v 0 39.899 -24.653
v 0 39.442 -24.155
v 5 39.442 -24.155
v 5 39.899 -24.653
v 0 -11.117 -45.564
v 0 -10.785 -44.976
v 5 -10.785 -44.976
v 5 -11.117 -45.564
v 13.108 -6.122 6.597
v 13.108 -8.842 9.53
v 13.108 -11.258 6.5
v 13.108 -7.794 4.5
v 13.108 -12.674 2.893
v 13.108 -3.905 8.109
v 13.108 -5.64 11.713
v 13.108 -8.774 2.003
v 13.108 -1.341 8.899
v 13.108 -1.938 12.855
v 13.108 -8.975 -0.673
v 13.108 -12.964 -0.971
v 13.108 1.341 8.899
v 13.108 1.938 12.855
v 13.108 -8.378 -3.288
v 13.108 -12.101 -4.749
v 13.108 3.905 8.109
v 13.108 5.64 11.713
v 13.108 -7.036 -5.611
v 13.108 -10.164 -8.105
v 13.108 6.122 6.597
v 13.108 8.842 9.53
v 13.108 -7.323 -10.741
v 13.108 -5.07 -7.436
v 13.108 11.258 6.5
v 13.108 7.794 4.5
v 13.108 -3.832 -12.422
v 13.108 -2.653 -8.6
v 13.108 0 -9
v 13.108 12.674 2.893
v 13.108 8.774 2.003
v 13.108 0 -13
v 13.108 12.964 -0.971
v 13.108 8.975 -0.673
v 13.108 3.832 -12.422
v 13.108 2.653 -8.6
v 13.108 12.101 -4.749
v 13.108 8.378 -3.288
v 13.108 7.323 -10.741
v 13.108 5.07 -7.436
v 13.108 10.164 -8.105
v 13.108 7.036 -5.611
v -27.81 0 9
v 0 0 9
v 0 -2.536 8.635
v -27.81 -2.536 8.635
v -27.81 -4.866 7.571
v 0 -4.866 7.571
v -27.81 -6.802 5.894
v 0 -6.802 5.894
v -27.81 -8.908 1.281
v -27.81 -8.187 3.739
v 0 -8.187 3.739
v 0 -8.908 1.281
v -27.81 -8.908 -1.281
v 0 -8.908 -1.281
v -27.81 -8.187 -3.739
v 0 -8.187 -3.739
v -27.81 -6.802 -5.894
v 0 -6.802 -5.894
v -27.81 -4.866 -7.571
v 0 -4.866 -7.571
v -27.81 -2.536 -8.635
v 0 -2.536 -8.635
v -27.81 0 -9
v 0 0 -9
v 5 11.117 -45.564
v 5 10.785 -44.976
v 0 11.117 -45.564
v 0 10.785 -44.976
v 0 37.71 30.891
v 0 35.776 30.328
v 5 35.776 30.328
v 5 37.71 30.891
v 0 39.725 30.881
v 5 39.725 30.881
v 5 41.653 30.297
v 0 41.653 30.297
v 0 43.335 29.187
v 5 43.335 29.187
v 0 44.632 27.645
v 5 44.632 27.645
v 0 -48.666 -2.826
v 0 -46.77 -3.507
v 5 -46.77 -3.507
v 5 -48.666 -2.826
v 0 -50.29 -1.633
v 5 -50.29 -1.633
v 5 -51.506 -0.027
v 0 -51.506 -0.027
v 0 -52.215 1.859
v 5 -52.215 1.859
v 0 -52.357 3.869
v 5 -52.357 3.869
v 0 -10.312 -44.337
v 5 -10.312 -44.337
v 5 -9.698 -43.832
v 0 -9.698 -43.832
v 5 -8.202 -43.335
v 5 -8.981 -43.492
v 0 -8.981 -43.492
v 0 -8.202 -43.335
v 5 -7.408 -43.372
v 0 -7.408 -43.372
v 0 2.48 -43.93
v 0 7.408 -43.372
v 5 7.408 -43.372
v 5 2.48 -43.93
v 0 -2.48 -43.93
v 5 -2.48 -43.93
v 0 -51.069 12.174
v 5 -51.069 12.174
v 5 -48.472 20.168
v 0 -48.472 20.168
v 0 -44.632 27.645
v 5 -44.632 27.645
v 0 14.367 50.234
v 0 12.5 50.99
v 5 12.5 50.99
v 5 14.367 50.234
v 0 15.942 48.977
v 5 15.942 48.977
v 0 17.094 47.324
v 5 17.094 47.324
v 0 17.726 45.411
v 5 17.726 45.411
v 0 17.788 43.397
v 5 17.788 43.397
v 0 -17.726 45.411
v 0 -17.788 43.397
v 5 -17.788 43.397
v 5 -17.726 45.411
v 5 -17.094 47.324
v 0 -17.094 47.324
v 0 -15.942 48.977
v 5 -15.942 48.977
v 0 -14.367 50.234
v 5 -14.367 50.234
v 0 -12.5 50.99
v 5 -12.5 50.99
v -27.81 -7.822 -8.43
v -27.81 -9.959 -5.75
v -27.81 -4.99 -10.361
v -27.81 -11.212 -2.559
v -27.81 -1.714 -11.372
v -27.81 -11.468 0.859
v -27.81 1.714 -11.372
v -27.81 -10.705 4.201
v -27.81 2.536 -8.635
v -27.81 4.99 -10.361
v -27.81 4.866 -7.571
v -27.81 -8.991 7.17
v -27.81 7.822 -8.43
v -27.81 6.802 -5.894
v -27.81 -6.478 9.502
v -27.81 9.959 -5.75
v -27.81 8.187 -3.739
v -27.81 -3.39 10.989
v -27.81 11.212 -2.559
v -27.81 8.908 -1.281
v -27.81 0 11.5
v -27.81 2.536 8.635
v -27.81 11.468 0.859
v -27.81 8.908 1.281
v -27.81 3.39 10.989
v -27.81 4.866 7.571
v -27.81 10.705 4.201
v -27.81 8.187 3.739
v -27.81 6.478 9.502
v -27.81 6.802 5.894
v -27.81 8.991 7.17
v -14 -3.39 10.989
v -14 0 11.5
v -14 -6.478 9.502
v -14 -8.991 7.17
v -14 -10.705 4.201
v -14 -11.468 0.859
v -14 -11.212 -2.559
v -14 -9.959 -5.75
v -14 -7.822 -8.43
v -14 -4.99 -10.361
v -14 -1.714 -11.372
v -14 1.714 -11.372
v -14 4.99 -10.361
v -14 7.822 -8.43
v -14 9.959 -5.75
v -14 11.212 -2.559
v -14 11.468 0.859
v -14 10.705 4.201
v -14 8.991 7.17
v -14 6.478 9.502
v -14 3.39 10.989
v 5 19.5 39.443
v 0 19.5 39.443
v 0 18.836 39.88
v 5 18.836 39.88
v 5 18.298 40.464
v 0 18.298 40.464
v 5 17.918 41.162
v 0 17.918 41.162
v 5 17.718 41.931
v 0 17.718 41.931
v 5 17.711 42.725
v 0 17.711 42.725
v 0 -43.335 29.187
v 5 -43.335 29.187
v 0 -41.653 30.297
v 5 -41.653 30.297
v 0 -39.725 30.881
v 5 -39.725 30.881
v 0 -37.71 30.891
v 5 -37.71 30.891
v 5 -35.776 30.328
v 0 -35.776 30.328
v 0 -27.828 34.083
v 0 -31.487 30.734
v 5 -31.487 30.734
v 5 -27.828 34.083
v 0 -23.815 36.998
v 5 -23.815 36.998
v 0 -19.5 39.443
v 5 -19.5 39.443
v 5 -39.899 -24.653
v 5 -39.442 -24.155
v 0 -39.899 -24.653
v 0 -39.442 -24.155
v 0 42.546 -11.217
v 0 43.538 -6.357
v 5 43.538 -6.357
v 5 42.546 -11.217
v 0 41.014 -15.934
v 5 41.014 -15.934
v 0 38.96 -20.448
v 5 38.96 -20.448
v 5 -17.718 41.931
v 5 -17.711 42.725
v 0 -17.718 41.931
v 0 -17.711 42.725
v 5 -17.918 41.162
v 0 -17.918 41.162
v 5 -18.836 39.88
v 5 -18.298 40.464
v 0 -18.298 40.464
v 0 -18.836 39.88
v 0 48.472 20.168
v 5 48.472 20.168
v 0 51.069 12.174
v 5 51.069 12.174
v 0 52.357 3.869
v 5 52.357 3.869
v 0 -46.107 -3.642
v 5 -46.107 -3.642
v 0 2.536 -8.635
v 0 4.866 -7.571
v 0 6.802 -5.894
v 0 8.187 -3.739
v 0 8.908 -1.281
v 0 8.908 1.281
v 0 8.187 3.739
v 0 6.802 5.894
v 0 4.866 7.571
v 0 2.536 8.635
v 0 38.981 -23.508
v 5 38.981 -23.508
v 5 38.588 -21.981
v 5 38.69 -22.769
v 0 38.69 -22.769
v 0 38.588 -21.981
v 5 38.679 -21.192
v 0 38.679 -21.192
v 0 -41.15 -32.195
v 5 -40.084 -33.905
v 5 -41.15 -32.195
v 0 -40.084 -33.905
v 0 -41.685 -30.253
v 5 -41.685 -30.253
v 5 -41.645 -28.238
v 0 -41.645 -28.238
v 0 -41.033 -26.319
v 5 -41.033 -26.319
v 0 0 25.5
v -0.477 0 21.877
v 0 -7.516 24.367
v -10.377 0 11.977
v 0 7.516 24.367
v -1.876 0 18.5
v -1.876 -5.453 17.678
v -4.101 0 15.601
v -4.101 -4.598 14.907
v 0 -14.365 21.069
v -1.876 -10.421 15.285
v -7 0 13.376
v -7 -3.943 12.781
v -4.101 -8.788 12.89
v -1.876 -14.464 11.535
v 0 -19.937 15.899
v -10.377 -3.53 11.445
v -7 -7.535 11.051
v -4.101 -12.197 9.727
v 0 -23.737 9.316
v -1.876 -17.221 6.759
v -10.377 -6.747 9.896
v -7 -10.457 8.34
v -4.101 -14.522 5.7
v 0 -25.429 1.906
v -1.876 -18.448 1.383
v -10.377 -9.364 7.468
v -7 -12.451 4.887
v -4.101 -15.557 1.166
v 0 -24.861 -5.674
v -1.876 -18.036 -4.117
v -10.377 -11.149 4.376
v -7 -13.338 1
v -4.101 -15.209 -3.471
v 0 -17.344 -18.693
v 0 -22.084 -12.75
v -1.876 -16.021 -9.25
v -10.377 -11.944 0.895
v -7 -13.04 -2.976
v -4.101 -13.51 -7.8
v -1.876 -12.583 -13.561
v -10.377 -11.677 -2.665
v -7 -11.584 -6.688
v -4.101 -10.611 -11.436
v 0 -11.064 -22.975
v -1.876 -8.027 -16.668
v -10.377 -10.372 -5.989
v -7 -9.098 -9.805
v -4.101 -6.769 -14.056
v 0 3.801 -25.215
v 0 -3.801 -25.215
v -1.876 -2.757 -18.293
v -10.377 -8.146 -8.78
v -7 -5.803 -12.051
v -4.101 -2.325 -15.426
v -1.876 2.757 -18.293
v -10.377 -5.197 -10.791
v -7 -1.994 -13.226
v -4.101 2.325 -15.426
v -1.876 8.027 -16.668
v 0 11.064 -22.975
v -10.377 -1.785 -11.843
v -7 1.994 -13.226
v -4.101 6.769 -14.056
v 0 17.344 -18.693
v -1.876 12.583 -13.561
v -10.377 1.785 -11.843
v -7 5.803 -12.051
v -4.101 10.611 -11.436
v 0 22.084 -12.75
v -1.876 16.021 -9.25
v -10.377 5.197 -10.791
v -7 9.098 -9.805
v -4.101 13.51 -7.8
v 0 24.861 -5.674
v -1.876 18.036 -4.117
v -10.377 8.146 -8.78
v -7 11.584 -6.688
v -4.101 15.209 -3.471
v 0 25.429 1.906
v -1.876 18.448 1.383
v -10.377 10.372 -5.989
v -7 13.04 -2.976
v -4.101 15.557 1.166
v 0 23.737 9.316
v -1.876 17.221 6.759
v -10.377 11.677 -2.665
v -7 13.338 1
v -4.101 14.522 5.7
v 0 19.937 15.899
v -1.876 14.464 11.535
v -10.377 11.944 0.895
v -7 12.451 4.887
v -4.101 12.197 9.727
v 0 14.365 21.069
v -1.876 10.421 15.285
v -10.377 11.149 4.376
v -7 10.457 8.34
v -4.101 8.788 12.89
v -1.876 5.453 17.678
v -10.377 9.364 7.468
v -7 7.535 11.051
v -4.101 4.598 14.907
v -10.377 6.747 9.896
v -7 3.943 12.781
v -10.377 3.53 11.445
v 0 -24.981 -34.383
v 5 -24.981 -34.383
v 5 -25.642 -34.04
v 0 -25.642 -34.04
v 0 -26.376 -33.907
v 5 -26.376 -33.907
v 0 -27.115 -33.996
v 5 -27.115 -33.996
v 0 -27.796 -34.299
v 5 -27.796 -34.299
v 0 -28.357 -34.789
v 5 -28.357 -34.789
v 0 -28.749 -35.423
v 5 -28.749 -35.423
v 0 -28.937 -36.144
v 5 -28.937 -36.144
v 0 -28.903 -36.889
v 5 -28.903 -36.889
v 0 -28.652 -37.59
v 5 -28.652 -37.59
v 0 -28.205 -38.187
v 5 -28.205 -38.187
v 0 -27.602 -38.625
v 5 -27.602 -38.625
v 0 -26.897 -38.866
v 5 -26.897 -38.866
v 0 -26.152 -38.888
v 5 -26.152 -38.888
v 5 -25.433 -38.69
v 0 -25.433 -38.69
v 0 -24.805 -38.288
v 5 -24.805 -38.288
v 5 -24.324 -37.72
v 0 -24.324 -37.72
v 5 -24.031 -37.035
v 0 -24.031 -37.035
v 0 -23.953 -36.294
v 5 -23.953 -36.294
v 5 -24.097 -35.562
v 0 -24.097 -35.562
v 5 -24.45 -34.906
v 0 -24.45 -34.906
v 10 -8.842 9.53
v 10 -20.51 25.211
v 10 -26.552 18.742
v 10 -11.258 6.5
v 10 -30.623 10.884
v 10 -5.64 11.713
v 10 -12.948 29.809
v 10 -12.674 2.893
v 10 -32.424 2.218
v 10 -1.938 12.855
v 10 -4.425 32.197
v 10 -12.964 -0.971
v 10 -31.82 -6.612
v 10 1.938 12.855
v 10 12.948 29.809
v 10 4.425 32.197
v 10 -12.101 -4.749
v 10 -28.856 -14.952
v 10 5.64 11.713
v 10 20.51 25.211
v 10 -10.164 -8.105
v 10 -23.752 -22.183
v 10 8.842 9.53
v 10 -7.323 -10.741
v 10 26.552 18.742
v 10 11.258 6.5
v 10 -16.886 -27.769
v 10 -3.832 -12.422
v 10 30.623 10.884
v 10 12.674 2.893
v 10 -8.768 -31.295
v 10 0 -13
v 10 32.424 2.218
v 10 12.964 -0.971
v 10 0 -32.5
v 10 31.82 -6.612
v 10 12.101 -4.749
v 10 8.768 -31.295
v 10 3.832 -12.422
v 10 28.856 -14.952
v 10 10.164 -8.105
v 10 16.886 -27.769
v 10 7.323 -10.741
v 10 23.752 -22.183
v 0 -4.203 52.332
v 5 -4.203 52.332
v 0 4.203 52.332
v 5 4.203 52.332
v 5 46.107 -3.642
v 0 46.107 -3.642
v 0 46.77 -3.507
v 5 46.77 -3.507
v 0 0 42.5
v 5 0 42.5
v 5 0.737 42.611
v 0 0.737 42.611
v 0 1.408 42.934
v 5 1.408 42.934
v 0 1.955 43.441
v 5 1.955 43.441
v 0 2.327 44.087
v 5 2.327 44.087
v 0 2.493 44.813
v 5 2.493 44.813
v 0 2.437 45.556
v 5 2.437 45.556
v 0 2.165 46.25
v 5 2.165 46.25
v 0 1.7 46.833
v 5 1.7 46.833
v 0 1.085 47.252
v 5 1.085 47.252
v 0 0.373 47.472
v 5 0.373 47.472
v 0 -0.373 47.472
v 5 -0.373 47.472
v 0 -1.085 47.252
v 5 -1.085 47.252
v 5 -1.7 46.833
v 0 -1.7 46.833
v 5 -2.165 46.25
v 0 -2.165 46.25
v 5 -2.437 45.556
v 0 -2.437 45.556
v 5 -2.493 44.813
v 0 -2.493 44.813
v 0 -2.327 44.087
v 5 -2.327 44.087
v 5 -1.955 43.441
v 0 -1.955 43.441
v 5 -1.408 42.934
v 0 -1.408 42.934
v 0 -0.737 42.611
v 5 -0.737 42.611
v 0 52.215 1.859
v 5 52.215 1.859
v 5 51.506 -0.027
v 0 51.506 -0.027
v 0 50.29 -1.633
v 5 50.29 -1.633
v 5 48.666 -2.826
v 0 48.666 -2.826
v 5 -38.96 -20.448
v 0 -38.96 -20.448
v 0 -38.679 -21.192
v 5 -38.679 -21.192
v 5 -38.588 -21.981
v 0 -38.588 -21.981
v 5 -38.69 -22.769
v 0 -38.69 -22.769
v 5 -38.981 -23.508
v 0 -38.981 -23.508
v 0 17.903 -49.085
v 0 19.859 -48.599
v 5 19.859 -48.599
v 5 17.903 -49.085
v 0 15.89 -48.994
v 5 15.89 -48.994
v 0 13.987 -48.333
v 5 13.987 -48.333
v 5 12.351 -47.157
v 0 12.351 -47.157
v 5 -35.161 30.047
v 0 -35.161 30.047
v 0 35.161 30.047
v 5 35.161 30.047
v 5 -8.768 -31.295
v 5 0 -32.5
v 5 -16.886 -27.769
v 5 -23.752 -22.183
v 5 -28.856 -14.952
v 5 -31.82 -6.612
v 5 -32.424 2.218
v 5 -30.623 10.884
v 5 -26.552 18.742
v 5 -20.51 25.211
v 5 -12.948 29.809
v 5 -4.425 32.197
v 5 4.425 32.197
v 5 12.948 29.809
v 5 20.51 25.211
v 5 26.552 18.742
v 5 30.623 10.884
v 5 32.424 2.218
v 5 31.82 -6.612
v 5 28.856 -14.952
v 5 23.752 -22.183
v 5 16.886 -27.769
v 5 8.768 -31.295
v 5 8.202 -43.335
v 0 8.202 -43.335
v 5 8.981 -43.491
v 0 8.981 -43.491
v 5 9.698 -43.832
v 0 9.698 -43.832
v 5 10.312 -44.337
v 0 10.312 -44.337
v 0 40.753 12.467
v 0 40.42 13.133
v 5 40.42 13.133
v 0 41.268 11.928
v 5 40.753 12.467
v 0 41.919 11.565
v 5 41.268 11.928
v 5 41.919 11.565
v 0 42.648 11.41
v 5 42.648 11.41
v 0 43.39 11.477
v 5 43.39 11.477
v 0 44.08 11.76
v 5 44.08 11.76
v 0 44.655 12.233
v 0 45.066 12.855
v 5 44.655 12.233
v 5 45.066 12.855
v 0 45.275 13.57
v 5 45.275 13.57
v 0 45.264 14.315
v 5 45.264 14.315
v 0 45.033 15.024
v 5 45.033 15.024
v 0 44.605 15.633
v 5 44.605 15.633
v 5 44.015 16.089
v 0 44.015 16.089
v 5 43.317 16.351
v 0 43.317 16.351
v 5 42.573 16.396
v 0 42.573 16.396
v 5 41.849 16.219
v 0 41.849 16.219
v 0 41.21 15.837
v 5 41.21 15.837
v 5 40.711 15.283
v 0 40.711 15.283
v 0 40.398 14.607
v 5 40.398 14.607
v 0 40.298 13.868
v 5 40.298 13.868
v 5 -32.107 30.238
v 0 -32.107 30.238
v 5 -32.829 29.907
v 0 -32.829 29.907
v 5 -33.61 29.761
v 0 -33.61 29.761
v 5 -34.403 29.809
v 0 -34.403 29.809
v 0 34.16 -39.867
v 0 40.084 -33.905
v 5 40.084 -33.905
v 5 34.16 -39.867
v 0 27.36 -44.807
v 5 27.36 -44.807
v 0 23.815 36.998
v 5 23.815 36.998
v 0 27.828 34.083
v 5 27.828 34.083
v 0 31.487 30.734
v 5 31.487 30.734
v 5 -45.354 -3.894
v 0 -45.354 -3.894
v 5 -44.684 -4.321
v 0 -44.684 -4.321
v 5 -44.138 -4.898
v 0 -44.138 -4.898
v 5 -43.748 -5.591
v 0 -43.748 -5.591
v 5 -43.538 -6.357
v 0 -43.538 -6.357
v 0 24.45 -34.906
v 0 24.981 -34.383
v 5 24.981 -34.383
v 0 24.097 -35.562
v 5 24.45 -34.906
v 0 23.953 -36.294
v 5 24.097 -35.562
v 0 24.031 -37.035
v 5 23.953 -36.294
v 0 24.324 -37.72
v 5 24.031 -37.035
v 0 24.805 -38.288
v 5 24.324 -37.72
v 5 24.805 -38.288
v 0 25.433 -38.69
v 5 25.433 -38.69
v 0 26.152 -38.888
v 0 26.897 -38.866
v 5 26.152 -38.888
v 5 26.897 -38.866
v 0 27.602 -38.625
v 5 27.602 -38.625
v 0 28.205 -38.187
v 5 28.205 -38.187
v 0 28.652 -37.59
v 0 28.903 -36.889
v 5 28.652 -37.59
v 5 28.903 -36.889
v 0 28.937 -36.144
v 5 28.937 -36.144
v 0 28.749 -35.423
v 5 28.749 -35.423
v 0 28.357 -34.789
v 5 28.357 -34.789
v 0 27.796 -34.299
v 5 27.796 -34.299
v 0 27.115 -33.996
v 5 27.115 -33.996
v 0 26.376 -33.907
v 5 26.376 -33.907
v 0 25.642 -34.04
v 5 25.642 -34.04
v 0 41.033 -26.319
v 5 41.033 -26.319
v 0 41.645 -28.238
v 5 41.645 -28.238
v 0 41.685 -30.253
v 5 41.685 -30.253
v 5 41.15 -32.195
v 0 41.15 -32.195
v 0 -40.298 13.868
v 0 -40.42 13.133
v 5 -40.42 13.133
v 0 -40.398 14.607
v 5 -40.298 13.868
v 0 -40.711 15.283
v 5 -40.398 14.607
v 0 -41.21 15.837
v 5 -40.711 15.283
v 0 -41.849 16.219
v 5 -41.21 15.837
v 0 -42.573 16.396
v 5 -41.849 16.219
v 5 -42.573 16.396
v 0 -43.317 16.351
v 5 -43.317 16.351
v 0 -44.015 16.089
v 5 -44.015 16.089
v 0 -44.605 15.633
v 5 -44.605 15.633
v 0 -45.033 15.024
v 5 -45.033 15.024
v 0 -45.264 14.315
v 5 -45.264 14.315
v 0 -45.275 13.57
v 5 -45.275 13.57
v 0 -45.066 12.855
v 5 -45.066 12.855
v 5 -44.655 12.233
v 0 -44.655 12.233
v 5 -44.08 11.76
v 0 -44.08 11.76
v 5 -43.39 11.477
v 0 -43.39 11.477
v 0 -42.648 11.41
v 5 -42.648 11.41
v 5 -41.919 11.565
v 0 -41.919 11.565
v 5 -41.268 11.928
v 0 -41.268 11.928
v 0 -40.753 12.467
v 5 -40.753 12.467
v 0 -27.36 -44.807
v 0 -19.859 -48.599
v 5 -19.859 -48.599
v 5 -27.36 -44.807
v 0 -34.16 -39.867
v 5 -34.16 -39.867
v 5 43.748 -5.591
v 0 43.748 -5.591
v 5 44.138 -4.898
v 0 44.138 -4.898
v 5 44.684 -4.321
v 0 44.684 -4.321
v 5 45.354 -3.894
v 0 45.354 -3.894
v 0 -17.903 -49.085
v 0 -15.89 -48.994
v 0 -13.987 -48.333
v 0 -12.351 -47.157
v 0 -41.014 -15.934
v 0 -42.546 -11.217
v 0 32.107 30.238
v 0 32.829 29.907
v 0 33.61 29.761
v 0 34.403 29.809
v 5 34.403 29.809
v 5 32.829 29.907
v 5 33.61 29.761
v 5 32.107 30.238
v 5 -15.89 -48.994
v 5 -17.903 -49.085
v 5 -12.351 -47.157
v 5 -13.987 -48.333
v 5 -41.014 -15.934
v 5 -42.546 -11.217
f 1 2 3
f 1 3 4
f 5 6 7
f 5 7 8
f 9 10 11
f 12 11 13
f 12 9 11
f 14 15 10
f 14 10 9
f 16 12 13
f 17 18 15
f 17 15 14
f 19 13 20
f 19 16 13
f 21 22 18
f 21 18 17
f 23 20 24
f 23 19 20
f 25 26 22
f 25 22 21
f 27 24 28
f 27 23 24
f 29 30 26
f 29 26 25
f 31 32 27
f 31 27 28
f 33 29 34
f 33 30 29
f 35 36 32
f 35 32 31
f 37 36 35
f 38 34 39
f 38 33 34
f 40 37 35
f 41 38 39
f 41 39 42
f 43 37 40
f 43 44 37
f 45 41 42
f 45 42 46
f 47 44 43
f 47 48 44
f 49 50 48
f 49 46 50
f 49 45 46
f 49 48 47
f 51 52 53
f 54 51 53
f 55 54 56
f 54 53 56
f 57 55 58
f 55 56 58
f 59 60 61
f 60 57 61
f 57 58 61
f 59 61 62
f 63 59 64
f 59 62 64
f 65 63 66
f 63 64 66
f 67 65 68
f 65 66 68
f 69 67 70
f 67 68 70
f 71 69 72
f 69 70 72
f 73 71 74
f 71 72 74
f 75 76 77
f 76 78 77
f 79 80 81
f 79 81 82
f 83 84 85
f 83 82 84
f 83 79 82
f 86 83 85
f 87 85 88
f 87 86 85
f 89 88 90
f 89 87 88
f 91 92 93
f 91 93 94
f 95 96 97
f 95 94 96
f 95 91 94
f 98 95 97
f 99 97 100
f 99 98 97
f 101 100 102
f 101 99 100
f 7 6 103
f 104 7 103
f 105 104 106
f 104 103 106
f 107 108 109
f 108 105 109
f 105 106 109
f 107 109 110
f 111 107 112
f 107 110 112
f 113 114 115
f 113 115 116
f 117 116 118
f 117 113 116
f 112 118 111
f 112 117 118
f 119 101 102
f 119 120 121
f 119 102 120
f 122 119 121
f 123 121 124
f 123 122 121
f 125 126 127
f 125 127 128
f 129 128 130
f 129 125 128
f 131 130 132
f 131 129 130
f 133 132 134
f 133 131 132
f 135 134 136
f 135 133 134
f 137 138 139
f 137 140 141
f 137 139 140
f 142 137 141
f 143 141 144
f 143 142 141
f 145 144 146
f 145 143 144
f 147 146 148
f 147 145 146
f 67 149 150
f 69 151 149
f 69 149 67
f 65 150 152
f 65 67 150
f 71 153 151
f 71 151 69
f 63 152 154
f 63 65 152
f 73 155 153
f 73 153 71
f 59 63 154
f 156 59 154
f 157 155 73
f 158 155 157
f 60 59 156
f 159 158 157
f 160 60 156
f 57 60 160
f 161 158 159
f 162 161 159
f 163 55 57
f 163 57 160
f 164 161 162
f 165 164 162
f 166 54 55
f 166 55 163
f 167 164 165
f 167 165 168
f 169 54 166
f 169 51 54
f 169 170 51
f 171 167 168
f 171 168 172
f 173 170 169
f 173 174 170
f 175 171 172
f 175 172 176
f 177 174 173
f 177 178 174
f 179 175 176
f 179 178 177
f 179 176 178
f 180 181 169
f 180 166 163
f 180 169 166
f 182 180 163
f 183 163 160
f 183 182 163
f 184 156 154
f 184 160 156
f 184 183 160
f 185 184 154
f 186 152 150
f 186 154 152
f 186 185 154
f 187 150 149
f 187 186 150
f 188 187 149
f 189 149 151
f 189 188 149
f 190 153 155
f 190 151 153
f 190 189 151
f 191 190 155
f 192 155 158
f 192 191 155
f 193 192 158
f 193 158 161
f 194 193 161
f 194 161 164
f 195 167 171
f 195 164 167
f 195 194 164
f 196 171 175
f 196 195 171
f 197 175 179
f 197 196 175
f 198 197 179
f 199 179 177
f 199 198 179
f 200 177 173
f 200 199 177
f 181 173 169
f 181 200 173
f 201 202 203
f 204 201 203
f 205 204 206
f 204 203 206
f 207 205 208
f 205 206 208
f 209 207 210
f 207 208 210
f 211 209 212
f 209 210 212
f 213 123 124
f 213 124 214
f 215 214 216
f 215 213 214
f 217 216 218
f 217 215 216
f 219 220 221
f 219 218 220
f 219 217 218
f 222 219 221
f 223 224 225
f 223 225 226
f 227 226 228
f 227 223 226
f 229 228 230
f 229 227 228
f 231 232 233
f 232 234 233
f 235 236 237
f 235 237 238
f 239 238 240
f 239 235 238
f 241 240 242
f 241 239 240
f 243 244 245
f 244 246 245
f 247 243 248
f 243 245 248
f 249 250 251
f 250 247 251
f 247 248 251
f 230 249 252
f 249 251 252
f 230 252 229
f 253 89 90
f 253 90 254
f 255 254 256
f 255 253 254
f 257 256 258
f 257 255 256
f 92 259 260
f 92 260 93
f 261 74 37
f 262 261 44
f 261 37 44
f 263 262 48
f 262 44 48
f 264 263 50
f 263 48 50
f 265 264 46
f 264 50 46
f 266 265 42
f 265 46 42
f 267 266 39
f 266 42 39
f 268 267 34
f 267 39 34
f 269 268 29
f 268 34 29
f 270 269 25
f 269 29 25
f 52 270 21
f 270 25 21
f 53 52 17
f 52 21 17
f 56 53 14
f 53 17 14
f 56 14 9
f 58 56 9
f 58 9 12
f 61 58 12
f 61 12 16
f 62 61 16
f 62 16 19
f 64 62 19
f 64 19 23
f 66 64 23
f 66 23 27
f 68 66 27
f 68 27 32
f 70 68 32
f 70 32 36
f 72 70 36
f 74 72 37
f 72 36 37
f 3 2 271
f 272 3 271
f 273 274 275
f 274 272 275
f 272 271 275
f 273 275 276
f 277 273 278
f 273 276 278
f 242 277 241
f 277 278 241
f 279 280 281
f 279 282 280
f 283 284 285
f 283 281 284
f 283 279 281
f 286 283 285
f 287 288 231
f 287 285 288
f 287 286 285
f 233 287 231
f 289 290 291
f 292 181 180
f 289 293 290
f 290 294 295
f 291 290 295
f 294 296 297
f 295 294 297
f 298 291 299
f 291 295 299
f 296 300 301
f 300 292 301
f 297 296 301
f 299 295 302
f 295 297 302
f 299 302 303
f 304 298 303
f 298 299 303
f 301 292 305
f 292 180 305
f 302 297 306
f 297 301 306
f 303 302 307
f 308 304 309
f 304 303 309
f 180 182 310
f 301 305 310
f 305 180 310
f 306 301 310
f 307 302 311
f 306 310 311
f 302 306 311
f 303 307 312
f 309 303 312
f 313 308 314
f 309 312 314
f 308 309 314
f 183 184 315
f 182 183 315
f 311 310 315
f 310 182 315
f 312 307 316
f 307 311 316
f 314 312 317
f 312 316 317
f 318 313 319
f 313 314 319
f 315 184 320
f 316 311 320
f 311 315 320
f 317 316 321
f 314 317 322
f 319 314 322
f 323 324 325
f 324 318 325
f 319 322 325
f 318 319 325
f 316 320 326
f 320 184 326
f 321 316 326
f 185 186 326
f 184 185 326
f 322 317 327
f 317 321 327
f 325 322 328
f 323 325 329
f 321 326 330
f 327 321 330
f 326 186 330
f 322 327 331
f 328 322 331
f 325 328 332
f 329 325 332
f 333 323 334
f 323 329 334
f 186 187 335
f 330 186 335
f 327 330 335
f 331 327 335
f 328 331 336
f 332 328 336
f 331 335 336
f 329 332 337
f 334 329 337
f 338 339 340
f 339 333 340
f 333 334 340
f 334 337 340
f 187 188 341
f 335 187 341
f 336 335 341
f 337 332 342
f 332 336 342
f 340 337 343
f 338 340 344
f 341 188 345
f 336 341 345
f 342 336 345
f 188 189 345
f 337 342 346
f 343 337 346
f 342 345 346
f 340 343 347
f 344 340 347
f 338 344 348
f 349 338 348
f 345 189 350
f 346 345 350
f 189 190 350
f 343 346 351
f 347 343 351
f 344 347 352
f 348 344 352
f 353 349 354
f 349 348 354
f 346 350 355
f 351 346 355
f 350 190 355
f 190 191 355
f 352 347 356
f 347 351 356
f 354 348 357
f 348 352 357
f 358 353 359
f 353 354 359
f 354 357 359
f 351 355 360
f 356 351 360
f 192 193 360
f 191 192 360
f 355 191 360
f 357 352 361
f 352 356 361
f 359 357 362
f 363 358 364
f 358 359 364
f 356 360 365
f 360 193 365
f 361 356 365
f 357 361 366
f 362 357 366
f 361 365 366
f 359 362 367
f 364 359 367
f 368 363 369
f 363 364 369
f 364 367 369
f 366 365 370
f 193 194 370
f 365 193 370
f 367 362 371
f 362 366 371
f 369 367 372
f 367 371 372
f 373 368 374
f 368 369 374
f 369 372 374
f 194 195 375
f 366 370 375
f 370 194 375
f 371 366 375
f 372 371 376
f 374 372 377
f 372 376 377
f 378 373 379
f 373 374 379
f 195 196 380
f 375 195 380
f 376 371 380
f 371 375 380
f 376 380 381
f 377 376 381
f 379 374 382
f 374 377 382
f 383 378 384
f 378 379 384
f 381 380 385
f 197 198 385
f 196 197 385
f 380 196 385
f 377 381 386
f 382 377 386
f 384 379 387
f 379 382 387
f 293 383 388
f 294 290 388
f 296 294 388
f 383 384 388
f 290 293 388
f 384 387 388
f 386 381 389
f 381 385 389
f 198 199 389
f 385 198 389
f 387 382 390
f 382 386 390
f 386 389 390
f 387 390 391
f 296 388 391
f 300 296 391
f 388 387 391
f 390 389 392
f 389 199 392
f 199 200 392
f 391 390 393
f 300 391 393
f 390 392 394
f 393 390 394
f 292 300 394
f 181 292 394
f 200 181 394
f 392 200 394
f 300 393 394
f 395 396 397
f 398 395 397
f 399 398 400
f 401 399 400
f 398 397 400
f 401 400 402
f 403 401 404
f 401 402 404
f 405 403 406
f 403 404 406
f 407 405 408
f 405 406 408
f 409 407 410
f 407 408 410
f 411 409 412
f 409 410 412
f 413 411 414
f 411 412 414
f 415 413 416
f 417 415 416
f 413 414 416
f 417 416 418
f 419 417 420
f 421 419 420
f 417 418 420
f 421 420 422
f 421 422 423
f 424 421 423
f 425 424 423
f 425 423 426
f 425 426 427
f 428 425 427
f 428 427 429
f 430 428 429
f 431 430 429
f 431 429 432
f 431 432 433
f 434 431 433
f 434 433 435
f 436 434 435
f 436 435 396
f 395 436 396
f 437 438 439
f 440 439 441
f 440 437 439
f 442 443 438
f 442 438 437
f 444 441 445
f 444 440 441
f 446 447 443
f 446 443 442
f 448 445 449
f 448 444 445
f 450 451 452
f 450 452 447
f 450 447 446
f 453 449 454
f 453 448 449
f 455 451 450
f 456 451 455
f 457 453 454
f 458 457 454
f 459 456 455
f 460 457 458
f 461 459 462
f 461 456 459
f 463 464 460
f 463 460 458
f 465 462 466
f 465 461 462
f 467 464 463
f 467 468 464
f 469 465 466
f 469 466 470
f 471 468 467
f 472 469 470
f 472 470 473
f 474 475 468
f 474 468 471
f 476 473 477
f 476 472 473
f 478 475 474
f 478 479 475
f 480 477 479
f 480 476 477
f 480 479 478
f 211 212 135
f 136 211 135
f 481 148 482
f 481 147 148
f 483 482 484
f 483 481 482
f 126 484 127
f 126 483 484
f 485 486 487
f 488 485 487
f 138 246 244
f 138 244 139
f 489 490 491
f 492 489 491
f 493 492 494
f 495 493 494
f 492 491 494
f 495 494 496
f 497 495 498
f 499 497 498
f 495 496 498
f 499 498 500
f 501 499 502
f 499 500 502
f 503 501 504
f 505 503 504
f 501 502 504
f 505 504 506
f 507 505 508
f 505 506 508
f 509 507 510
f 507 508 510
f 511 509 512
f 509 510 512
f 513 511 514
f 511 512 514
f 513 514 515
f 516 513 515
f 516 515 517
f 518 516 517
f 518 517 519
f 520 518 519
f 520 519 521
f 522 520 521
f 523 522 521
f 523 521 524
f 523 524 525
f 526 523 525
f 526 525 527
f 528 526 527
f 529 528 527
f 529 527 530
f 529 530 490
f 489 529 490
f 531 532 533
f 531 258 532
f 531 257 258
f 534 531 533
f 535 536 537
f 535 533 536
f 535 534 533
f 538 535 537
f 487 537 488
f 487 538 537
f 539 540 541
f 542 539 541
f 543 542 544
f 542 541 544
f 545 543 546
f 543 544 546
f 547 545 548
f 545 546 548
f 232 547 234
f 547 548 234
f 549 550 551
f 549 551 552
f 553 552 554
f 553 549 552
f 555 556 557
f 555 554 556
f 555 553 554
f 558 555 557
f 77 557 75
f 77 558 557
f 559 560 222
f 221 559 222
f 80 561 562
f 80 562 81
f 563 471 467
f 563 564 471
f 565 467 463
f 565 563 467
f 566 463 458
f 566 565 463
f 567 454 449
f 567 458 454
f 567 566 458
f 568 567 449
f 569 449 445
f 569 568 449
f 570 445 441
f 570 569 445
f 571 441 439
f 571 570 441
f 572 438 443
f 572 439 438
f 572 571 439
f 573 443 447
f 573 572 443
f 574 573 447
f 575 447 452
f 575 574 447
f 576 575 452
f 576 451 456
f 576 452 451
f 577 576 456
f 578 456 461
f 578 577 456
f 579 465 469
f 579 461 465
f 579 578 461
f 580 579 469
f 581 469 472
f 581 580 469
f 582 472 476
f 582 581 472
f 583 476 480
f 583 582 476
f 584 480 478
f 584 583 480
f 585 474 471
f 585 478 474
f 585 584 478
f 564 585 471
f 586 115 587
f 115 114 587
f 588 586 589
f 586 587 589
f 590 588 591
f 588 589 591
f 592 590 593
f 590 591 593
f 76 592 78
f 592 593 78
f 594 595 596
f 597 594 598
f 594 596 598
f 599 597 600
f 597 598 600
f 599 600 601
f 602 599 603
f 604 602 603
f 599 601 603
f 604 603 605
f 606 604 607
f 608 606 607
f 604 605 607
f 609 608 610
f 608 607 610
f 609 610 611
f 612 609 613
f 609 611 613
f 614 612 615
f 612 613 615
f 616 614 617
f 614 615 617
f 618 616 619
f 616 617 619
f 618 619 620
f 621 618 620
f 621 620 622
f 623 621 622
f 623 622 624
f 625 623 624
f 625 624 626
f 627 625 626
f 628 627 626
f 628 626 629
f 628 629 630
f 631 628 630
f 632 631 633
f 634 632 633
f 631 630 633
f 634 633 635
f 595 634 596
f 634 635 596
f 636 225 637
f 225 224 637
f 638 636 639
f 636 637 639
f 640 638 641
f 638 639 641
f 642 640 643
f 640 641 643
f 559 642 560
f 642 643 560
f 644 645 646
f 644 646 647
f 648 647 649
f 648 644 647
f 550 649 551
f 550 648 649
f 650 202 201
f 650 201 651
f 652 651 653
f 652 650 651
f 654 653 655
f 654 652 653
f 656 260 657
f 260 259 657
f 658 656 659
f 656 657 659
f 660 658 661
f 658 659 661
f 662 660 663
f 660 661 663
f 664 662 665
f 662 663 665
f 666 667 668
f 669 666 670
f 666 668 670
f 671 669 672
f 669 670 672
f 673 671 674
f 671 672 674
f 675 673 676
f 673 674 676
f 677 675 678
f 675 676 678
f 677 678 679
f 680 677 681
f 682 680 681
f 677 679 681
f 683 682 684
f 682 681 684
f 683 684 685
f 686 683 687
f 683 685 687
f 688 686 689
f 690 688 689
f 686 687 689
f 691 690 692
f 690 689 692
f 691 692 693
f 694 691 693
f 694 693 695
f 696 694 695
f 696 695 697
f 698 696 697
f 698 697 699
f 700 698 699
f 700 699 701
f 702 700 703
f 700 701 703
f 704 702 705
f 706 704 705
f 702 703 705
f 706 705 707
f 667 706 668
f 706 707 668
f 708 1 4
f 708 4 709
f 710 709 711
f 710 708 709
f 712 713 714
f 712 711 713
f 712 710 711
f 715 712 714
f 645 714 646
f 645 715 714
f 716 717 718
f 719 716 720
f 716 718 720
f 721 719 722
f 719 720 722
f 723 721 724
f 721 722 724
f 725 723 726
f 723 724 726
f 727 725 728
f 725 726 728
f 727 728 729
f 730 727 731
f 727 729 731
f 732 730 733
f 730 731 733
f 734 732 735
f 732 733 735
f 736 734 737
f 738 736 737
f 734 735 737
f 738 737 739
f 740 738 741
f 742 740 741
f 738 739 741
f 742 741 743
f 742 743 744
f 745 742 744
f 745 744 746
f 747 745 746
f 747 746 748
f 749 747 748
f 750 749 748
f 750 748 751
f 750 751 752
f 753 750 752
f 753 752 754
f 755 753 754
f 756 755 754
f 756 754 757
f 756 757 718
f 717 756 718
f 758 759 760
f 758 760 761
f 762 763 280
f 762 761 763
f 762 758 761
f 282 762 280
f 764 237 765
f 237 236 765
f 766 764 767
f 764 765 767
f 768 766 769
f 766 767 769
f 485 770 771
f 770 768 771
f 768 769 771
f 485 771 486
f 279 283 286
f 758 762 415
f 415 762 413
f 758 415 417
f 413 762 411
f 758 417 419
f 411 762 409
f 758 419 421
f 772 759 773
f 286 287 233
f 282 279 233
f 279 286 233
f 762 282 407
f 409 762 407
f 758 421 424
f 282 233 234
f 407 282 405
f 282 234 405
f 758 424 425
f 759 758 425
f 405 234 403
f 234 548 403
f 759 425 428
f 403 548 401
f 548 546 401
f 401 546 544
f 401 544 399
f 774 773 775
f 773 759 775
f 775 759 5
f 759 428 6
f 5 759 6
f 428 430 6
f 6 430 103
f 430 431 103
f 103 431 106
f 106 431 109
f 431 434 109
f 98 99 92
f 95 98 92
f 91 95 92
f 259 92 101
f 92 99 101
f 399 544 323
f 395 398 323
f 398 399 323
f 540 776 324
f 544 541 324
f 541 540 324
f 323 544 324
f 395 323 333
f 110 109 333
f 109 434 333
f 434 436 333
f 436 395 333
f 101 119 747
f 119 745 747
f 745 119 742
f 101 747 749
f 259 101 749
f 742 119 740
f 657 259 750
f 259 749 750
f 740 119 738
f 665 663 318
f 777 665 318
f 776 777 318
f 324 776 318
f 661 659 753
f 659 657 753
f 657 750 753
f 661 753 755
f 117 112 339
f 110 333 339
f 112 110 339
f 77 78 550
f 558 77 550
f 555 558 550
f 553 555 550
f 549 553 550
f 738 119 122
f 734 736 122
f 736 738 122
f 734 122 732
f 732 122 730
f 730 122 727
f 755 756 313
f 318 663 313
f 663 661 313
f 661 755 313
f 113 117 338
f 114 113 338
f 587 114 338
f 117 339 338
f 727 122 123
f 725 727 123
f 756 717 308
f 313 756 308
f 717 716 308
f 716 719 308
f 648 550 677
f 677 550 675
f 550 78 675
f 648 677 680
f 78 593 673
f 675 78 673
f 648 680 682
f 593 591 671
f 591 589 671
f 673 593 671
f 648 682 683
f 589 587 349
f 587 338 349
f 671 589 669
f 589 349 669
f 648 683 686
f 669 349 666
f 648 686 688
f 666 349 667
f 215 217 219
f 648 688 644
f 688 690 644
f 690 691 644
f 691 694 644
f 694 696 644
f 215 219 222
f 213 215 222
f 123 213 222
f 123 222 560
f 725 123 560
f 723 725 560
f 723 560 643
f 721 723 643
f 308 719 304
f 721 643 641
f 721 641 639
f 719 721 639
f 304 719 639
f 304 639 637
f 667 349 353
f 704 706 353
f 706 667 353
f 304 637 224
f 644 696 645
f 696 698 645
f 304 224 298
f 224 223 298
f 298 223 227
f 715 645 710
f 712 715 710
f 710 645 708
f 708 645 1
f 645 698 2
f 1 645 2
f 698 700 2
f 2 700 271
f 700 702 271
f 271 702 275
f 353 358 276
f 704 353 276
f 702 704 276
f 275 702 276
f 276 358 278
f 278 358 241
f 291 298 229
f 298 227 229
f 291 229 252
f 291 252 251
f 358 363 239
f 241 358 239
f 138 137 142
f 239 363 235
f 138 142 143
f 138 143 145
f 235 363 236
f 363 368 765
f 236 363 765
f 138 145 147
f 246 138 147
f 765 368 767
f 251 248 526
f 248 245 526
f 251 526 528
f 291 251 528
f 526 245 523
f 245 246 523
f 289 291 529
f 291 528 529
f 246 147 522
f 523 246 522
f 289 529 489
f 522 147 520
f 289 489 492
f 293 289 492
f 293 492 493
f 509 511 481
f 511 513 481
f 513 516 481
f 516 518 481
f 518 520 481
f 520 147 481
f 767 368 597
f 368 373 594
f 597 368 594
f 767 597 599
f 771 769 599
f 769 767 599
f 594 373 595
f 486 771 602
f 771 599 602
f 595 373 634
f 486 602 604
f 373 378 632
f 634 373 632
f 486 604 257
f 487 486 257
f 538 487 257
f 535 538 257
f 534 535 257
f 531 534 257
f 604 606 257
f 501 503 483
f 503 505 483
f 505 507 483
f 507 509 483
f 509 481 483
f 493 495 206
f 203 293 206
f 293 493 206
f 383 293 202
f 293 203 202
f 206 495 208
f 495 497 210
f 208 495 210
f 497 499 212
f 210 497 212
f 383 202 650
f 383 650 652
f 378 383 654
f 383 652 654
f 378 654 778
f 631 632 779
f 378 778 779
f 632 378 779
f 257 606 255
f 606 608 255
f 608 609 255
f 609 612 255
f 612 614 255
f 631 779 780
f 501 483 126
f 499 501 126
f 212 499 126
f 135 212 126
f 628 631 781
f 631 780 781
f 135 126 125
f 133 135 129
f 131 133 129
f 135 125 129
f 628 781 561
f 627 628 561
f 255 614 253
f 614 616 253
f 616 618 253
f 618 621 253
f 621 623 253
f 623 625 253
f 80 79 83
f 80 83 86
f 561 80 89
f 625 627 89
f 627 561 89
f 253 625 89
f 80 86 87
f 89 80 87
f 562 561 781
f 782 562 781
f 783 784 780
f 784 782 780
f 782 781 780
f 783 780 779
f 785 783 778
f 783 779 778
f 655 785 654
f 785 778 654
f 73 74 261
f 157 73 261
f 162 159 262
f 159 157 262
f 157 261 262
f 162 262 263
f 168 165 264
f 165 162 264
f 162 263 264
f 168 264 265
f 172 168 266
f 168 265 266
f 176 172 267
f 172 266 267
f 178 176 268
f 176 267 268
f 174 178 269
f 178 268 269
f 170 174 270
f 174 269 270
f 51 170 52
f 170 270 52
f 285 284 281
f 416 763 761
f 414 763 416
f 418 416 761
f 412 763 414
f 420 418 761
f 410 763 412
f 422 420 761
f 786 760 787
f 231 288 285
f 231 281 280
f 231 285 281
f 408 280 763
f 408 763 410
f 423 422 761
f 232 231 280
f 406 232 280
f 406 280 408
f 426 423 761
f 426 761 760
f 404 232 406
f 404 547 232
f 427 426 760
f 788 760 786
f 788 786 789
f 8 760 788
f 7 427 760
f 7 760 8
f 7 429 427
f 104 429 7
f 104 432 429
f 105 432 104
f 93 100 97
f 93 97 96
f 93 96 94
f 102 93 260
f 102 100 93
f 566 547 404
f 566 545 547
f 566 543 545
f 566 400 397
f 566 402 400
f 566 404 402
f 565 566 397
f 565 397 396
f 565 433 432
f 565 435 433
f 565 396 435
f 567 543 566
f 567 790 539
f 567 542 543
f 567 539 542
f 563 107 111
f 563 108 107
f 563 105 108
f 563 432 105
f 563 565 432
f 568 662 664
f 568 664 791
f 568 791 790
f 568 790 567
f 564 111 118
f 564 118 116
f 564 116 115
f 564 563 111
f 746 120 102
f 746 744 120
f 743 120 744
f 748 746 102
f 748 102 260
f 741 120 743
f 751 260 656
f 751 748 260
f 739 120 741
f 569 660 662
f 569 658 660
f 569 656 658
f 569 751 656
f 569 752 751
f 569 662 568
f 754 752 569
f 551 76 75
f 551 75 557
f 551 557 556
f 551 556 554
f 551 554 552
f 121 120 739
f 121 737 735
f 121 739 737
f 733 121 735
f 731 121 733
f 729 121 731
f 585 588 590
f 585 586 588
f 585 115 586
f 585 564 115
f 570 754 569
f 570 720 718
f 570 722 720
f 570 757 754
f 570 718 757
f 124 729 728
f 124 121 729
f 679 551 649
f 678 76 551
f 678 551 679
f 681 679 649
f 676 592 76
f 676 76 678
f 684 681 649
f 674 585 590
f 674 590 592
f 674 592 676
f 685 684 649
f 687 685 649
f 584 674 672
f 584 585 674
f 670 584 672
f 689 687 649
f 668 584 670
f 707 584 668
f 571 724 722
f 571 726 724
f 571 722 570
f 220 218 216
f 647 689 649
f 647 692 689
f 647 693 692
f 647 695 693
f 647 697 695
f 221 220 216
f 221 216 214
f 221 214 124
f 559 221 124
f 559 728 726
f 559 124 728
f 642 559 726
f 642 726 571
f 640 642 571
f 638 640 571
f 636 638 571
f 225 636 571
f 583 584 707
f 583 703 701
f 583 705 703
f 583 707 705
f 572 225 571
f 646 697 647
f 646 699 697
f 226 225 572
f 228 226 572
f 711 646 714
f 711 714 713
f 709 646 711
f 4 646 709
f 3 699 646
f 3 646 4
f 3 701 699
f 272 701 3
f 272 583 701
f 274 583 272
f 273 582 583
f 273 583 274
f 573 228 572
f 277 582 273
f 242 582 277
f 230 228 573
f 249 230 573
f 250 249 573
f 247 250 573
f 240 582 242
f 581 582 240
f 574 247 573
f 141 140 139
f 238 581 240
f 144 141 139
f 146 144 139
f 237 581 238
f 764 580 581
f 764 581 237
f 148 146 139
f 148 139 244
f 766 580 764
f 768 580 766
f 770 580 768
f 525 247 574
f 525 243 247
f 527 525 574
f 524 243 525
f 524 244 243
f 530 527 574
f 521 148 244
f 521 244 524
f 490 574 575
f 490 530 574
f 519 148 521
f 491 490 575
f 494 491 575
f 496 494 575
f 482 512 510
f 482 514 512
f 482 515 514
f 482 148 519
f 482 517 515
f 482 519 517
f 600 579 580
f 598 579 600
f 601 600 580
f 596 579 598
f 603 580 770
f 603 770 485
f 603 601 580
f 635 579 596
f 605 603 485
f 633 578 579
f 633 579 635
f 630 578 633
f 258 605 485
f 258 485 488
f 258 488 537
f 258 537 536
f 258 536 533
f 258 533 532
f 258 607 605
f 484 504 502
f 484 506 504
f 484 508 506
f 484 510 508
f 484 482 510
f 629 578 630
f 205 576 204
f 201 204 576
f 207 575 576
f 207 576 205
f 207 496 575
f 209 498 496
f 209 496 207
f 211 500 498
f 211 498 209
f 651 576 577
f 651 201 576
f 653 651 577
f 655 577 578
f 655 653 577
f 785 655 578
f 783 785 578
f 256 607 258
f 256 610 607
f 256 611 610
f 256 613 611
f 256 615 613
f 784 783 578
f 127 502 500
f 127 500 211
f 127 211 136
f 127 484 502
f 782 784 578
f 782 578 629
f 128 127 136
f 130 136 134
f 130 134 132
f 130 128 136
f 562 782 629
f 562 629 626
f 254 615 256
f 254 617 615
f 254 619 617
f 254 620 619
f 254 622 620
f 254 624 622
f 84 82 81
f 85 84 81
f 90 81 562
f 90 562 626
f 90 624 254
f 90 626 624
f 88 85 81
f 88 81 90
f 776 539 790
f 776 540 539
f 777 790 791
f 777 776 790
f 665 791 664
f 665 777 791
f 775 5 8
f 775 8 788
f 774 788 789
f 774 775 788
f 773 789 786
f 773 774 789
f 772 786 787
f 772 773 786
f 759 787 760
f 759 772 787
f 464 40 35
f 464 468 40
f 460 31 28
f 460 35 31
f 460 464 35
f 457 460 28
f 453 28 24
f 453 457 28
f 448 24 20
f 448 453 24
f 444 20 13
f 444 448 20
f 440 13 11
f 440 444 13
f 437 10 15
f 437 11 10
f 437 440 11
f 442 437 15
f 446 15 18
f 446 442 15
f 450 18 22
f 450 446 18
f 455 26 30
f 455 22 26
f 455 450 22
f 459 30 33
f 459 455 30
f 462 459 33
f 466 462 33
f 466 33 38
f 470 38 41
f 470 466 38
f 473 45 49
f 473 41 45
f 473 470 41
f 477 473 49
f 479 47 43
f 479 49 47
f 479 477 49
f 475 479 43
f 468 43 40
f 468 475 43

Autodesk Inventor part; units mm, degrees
ref_plane "YZ Plane" through (0, 0, 0) normal (1, 0, 0) x (0, 1, 0)
ref_plane "XZ Plane" through (0, 0, 0) normal (0, 1, 0) x (-1, 0, 0)
ref_plane "XY Plane" through (0, 0, 0) normal (0, 0, 1) x (1, 0, 0)
sketch "Sketch2" plane through (0, 0, 0) normal (1, 0, 0) x (0, 1, 0)
  arc A0 (12.5, 50.9902) -> (-12.5, 50.9902) centre (0, 0) ccw
  arc A1 (-19.5, 39.443) -> (-17.7114, 42.7254) centre (-20.9403, 42.3564) ccw
  line L0 (-17.7114, 42.7254) -> (-17.7881, 43.3968)
  arc A2 (-12.5, 50.9902) -> (-17.7881, 43.3968) centre (-10.8333, 44.1915) ccw
  line L1 (0, 0) -> (0, 52.5) construction
  arc A3 (17.7114, 42.7254) -> (19.5, 39.443) centre (20.9403, 42.3564) ccw
  line L2 (17.7114, 42.7254) -> (17.7881, 43.3968)
  arc A4 (17.7881, 43.3968) -> (12.5, 50.9902) centre (10.8333, 44.1915) ccw
  arc A5 (-44.6318, 27.645) -> (-52.3573, 3.8686) centre (0, 0) ccw
  arc A6 (-43.5384, -6.357) -> (-46.1074, -3.6416) centre (-46.7543, -6.8266) ccw
  line L3 (-46.1074, -3.6416) -> (-46.7696, -3.5071)
  arc A7 (-52.3573, 3.8686) -> (-46.7696, -3.5071) centre (-45.3763, 3.3528) ccw
  line L4 (0, 0) -> (-49.9305, 16.2234) construction
  arc A8 (-35.776, 30.3278) -> (-44.6318, 27.645) centre (-38.6809, 23.959) ccw
  line L5 (-35.1611, 30.0474) -> (-35.776, 30.3278)
  arc A9 (-35.1611, 30.0474) -> (-31.4867, 30.7342) centre (-33.8124, 33.0043) ccw
  arc A10 (-40.084, -33.9046) -> (-19.8586, -48.5993) centre (0, 0) ccw
  arc A11 (-7.4082, -43.3719) -> (-10.7846, -44.976) centre (-7.9554, -46.5755) ccw
  line L6 (-10.7846, -44.976) -> (-11.1171, -45.5643)
  arc A12 (-19.8586, -48.5993) -> (-11.1171, -45.5643) centre (-17.2108, -42.1194) ccw
  line L7 (0, 0) -> (-30.8587, -42.4734) construction
  arc A13 (-39.8989, -24.6532) -> (-40.084, -33.9046) centre (-34.7395, -29.384) ccw
  line L8 (-39.4421, -24.1551) -> (-39.8989, -24.6532)
  arc A14 (-39.4421, -24.1551) -> (-38.9598, -20.4482) centre (-41.8376, -21.9586) ccw
  arc A15 (19.8586, -48.5993) -> (40.084, -33.9046) centre (0, 0) ccw
  arc A16 (38.9598, -20.4482) -> (39.4421, -24.1551) centre (41.8376, -21.9586) ccw
  line L9 (39.4421, -24.1551) -> (39.8989, -24.6532)
  arc A17 (40.084, -33.9046) -> (39.8989, -24.6532) centre (34.7395, -29.384) ccw
  line L10 (0, 0) -> (30.8587, -42.4734) construction
  arc A18 (11.1171, -45.5643) -> (19.8586, -48.5993) centre (17.2108, -42.1194) ccw
  line L11 (10.7846, -44.976) -> (11.1171, -45.5643)
  arc A19 (10.7846, -44.976) -> (7.4082, -43.3719) centre (7.9554, -46.5755) ccw
  arc A20 (52.3573, 3.8686) -> (44.6318, 27.645) centre (0, 0) ccw
  arc A21 (31.4867, 30.7342) -> (35.1611, 30.0474) centre (33.8124, 33.0043) ccw
  line L12 (35.1611, 30.0474) -> (35.776, 30.3278)
  arc A22 (44.6318, 27.645) -> (35.776, 30.3278) centre (38.6809, 23.959) ccw
  line L13 (0, 0) -> (49.9305, 16.2234) construction
  arc A23 (46.7696, -3.5071) -> (52.3573, 3.8686) centre (45.3763, 3.3528) ccw
  line L14 (46.1074, -3.6416) -> (46.7696, -3.5071)
  arc A24 (46.1074, -3.6416) -> (43.5384, -6.357) centre (46.7543, -6.8266) ccw
  arc A25 (38.9598, -20.4482) -> (43.5384, -6.357) centre (0, 0) ccw
  arc A26 (-7.4082, -43.3719) -> (7.4082, -43.3719) centre (0, 0) ccw
  arc A27 (-43.5384, -6.357) -> (-38.9598, -20.4482) centre (0, 0) ccw
  arc A28 (31.4867, 30.7342) -> (19.5, 39.443) centre (0, 0) ccw
  arc A29 (-19.5, 39.443) -> (-31.4867, 30.7342) centre (0, 0) ccw
  dimension "d75" = 52.5
  dimension "d76" = 7
  dimension "d77" = 3.25
  dimension "d80" = 360
  dimension "d83" = 44
  dimension "d84" = 12.5
  dimension "d85" = 19.5
extrude "Extrusion1" add sketch "Sketch2" along normal blind 5
sketch "Sketch3" plane through (0, 0, 0) normal (-1, 0, 0) x (0, 0, 1)
  circle A0 centre (0, 0) radius 11.5
  circle A1 centre (0, 0) radius 9
  point P0 (0, 0)
  dimension "d55" = 23
  dimension "d56" = 18
extrude "Extrusion2" add sketch "Sketch3" along normal blind 27.81
fillet "Fillet1" radius 14 1 edges at (0, 0, -11.5)
sketch "Sketch4" plane through (5, 0, 0) normal (1, 0, 0) x (0, 0, -1)
  circle A0 centre (0, 0) radius 32.5
  point P0 (0, 0)
  dimension "d60" = 65
extrude "Extrusion3" add sketch "Sketch4" along normal blind 5
sketch "Sketch5" plane through (10, 0, 0) normal (1, 0, 0) x (0, 0, -1)
  circle A0 centre (0, 0) radius 13
  point P0 (0, 0)
  dimension "d63" = 26
extrude "Extrusion4" add sketch "Sketch5" along normal blind 3.108
sketch "Sketch6" plane through (13.108, 0, 0) normal (1, 0, 0) x (0, 0, -1)
  circle A0 centre (0, 0) radius 9 projected
  point P0 (0, 0)
extrude "Extrusion5" cut sketch "Sketch6" against normal through all
sketch "Sketch7" plane through (5, 0, 0) normal (1, 0, 0) x (0, 0, -1)
  circle A0 centre (-45, 0) radius 2.5
  point P0 (0, 0)
  dimension "d68" = 45
  dimension "d69" = 5
extrude "Extrusion6" cut sketch "Sketch7" against normal through all
pattern_circular "Circular Pattern1" count 5 over 360 about axis through (-10, 0, 0) along (1, 0, 0) of "Extrusion6"
properties part number "362-03"
